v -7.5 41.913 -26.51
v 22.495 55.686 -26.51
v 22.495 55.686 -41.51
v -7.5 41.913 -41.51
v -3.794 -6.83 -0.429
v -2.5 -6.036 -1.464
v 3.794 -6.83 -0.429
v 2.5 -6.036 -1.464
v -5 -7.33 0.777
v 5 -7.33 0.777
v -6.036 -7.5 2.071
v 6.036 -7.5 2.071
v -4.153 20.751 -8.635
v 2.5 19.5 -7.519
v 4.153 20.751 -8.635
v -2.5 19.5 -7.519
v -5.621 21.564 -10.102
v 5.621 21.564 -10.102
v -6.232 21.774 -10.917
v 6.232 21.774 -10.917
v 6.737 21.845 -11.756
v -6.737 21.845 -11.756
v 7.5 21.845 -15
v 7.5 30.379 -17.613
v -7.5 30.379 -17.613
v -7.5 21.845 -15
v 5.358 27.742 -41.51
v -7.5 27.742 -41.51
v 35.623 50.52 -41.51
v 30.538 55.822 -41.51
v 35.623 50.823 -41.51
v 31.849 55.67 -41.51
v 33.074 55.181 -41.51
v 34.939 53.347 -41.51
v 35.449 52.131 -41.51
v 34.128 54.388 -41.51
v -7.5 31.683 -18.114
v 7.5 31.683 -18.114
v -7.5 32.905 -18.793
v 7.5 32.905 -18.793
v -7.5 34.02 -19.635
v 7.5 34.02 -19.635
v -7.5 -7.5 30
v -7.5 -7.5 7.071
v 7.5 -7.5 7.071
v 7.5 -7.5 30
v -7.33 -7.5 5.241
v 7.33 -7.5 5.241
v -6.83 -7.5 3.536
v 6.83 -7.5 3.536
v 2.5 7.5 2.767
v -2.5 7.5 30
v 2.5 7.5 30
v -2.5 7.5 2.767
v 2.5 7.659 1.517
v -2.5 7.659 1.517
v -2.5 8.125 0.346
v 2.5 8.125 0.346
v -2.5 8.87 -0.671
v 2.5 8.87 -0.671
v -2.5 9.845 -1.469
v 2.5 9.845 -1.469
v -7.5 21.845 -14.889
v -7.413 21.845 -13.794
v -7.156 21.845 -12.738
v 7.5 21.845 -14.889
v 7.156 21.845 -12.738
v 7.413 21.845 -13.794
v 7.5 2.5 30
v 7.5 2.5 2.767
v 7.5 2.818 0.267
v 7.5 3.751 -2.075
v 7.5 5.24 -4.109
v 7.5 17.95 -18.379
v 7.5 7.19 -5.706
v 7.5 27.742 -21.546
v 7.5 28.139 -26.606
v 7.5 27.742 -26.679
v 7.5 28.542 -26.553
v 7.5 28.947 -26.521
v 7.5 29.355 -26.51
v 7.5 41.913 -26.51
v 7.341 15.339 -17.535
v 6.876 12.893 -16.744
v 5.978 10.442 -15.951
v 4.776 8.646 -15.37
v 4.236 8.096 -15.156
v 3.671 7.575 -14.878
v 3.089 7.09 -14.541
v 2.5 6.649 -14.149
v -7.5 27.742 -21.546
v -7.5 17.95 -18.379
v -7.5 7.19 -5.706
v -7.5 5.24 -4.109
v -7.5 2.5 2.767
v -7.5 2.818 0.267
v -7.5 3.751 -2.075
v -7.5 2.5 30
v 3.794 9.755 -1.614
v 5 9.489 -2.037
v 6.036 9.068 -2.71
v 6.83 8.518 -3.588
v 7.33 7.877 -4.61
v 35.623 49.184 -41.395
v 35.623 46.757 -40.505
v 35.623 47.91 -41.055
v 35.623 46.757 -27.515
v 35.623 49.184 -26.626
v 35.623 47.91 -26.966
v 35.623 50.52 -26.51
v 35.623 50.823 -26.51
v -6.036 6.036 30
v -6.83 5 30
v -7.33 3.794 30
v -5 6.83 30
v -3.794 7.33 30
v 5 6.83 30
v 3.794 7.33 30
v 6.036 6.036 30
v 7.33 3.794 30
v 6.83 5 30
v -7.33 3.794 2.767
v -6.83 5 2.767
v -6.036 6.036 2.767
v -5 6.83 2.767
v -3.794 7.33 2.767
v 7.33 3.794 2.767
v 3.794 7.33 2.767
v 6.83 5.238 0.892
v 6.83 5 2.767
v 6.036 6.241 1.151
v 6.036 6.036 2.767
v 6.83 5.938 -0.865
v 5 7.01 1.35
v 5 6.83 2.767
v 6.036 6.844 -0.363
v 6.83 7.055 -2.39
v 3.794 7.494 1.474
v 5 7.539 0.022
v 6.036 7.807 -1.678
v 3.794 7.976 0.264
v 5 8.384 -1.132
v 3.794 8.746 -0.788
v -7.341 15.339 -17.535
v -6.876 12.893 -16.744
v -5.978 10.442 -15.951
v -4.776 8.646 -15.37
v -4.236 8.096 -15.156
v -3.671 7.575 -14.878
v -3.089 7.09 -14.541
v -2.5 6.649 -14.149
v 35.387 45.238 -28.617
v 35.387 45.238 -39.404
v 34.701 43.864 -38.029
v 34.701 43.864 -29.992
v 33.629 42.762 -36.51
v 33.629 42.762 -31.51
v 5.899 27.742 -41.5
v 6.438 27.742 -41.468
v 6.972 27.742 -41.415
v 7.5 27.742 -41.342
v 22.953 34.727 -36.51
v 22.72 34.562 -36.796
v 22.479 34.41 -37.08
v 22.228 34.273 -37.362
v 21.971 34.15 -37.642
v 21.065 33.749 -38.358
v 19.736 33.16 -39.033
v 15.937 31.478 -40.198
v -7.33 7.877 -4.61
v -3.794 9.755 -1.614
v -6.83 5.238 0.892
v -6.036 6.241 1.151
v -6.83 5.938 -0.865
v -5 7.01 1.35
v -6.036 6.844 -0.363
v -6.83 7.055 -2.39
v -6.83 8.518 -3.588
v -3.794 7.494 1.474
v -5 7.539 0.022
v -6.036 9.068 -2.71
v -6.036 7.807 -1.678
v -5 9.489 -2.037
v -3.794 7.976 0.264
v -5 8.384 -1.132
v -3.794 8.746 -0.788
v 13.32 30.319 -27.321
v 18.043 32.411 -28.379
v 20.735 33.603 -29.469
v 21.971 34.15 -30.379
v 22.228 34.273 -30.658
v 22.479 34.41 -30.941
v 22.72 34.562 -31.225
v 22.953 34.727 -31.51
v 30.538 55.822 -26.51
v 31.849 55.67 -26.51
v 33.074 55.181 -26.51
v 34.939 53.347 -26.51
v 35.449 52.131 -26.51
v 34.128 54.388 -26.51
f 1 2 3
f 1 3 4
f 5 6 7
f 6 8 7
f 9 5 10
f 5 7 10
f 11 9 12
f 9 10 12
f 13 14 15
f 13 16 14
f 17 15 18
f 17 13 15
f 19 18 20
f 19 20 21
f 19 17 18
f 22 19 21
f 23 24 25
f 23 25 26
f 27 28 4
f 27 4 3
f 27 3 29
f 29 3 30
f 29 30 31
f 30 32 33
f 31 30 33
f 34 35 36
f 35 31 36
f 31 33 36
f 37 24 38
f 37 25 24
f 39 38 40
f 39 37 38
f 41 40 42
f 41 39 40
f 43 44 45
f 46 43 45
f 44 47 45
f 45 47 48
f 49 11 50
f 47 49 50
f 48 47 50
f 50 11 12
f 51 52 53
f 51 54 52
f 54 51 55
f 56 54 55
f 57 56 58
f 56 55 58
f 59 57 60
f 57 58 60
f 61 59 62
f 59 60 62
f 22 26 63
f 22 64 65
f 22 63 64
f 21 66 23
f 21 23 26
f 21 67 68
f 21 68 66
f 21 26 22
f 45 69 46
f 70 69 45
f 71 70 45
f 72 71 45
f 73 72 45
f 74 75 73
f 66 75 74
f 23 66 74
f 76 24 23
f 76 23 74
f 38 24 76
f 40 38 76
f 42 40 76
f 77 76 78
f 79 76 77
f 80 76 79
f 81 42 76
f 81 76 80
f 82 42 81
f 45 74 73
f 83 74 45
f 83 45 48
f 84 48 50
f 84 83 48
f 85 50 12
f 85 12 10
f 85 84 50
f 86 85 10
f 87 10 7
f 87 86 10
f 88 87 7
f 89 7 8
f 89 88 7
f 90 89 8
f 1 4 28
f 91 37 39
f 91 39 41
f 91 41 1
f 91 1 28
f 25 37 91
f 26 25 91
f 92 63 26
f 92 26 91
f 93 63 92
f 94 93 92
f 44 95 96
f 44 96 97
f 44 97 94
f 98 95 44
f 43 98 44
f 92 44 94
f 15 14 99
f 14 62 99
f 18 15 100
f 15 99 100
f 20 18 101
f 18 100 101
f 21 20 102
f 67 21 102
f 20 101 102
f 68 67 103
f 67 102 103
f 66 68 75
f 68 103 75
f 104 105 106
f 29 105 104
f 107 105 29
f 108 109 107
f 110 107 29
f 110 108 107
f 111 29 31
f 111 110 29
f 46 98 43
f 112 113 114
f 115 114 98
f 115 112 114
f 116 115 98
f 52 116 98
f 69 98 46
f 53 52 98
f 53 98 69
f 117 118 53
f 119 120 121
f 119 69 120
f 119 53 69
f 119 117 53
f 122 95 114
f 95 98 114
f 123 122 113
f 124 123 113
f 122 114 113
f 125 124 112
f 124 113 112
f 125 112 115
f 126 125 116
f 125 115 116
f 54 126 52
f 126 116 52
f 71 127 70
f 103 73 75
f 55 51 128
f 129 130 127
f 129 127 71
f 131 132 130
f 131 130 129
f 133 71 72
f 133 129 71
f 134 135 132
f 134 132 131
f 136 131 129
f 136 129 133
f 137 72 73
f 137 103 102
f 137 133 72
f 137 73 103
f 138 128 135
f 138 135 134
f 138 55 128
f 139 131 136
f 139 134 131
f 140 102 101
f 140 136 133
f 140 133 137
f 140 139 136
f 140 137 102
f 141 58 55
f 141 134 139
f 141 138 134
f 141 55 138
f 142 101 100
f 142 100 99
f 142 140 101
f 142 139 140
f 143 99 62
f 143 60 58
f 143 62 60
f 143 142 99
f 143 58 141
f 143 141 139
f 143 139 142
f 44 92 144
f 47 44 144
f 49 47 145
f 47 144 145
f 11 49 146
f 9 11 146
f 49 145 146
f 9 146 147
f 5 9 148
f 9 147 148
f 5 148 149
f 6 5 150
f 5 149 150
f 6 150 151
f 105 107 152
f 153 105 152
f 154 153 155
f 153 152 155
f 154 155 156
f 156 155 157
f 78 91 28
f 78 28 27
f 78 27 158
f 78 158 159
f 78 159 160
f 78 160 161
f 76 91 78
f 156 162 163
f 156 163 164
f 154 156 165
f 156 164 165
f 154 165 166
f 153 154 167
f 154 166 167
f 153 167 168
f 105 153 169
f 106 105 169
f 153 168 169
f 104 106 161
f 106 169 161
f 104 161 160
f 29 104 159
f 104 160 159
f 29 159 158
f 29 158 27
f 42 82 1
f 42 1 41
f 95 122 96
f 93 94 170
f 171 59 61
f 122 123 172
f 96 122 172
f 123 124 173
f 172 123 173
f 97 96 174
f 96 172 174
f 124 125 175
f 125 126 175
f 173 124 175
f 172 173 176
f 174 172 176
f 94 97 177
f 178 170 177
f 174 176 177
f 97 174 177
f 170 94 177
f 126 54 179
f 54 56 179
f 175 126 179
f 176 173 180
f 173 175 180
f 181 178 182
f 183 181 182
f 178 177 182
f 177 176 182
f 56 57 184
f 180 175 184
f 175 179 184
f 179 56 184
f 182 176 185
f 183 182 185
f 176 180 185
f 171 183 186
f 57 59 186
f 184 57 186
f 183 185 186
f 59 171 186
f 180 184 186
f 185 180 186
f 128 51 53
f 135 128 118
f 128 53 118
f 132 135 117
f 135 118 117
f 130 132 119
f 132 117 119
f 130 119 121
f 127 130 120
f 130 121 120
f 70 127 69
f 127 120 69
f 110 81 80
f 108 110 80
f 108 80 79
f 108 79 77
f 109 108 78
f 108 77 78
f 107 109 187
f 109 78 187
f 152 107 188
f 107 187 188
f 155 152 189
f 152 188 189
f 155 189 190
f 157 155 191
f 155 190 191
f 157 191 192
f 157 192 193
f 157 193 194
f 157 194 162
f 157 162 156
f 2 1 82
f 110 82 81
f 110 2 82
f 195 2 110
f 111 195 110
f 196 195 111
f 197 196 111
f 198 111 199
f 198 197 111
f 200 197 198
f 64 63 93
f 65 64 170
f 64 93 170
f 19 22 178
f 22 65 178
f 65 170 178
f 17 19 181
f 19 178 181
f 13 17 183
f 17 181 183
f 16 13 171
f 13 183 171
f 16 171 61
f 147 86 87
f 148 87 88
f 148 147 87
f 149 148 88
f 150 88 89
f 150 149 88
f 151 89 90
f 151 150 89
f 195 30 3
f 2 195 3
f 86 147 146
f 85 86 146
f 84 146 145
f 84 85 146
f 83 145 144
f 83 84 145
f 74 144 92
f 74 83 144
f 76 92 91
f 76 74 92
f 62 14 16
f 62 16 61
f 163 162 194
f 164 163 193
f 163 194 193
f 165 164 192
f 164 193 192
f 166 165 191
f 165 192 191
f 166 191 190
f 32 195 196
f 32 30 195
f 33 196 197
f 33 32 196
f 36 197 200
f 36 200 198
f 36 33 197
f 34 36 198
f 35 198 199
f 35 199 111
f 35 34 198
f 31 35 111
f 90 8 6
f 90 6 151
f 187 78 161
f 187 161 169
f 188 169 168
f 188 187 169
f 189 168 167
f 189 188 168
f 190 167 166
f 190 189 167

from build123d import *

# Parameters (mm, degrees)
SKETCH1_W           = 15
SKETCH1_H           = 15
BOSS_EXTRUDE1_DEPTH = 30
BOSS_EXTRUDE2_DEPTH = 15
BOSS_EXTRUDE3_DEPTH = 15
FILLET1_R           = 5
FILLET2_R           = 5
FILLET3_R           = 5
FILLET4_R           = 5
FILLET5_R           = 10


with BuildPart() as part:
    # Sketch1 → Boss-Extrude1 (new body)
    with BuildSketch(Plane.XY):
        Rectangle(SKETCH1_W, SKETCH1_H)
    extrude(amount=BOSS_EXTRUDE1_DEPTH)

    # Sketch2 → Boss-Extrude2 (add)
    with BuildSketch(Plane(origin=(7.5, 0, 0), x_dir=(0, 0, -1), z_dir=(1, 0, 0))):
        Polygon((0, 7.5), (0, -7.5), (15, 7.5), (21.545785732, 27.742247112), (26.510349476, 27.742247112), (26.510349476, 32.414777695), (26.510349476, 41.912857566), (18.236076569, 32.414777695), (15, 21.844799658), (8.988359791, 21.844799658), align=None)
    extrude(amount=-BOSS_EXTRUDE2_DEPTH)

    # Sketch3 → Boss-Extrude3 (add)
    with BuildSketch(Plane(origin=(0, 0, -26.510349476), x_dir=(-1, 0, 0), z_dir=(0, 0, -1))):
        Polygon((-7.5, 27.742247112), (-22.495127837, 34.382116855), (-35.622841112, 44.261996271), (-35.622841112, 55.90842978), (-22.495127837, 55.685698079), (7.5, 41.912857566), (7.5, 27.742247112), align=None)
    extrude(amount=BOSS_EXTRUDE3_DEPTH)

    # Fillet1
    fillet1_edges = [part.edges().sort_by_distance(p)[0] for p in [
        (35.622841112, 55.90842978, -34.010349476),
    ]]
    fillet(fillet1_edges, radius=FILLET1_R)

    # Fillet2
    # the kernel refuses this fillet: 5 mm, written as the material it takes off along each edge
    with BuildSketch(Plane(origin=(-7.467478677, 11.832344997, -41.510349476), x_dir=(0, 0, 1), z_dir=(0.7990028403879673, 0.6013272495504927, 0))) as fillet2_piece_1:
        with BuildLine():
            CenterArc((FILLET2_R, -FILLET2_R), FILLET2_R, 90, 90)
            Line((0, -FILLET2_R), (0, 0))
            Line((0, 0), (FILLET2_R, 0))
        make_face()
    extrude(amount=66.430120909, mode=Mode.SUBTRACT)
    with BuildSketch(Plane(origin=(22.495127837, 34.382116855, -25.077185007), x_dir=(0.7990028403879682, 0.6013272495504913, 0), z_dir=(0, 0, -1))) as fillet2_piece_2:
        with BuildLine():
            CenterArc((FILLET2_R * 0.11465315755, -FILLET2_R), FILLET2_R, 90, 13.081164811)
            Line((-FILLET2_R * 0.111677956622, -FILLET2_R * 0.0259495768916), (0, 0))
            Line((0, 0), (FILLET2_R * 0.11465315755, 0))
        make_face()
    extrude(amount=17.866328939, mode=Mode.SUBTRACT)
    with BuildSketch(Plane(origin=(-7.467478677, 11.832344997, -26.510349476), x_dir=(-0.6013272495504927, 0.7990028403879673, 0), z_dir=(0.7990028403879673, 0.6013272495504927, 0))) as fillet2_piece_3_section:
        with BuildLine():
            CenterArc((FILLET2_R, -FILLET2_R), FILLET2_R, 90, 90)
            Line((0, -FILLET2_R), (0, 0))
            Line((0, 0), (FILLET2_R, 0))
        make_face()
    fillet2_piece_3 = extrude(amount=66.430120909, mode=Mode.PRIVATE)
    fillet2_piece_3 = split(fillet2_piece_3, bisect_by=Plane(origin=(7.5, 11.832344997, -26.510349476), z_dir=(1, 0, 0)), keep=Keep.TOP, mode=Mode.PRIVATE)
    add(fillet2_piece_3, mode=Mode.SUBTRACT)
    with BuildSketch(Plane(origin=(35.622841112, 44.261996271, -20.2733136), x_dir=(0, 1, 0), z_dir=(0, 0, -1))) as fillet2_piece_4:
        with BuildLine():
            CenterArc((FILLET2_R * 0.498962870089, -FILLET2_R), FILLET2_R, 90, 53.03498585)
            Line((-FILLET2_R * 0.300039970299, -FILLET2_R * 0.39867275045), (0, 0))
            Line((0, 0), (FILLET2_R * 0.498962870089, 0))
        make_face()
    extrude(amount=27.474071752, mode=Mode.SUBTRACT)

    # Fillet3
    fillet3_edges = [part.edges().sort_by_distance(p)[0] for p in [
        (0, 7.5, -15),
        (7.5, 0, -7.5),
        (-7.5, 0, -7.5),
        (0, -7.5, 0),
    ]]
    fillet(fillet3_edges, radius=FILLET3_R)

    # Fillet4
    fillet4_edges = [part.edges().sort_by_distance(p)[0] for p in [
        (0, 21.844799658, -8.988359791),
        (7.5, 14.672399829, -4.494179896),
        (-7.5, 14.672399829, -4.494179896),
        (0, 7.5, 0),
        (-7.5, 7.5, 15),
        (7.5, 7.5, 15),
    ]]
    fillet(fillet4_edges, radius=FILLET4_R)

    # Fillet5
    fillet5_edges = [part.edges().sort_by_distance(p)[0] for p in [
        (0, 32.414777695, -18.236076569),
    ]]
    fillet(fillet5_edges, radius=FILLET5_R)


solid = part.part
